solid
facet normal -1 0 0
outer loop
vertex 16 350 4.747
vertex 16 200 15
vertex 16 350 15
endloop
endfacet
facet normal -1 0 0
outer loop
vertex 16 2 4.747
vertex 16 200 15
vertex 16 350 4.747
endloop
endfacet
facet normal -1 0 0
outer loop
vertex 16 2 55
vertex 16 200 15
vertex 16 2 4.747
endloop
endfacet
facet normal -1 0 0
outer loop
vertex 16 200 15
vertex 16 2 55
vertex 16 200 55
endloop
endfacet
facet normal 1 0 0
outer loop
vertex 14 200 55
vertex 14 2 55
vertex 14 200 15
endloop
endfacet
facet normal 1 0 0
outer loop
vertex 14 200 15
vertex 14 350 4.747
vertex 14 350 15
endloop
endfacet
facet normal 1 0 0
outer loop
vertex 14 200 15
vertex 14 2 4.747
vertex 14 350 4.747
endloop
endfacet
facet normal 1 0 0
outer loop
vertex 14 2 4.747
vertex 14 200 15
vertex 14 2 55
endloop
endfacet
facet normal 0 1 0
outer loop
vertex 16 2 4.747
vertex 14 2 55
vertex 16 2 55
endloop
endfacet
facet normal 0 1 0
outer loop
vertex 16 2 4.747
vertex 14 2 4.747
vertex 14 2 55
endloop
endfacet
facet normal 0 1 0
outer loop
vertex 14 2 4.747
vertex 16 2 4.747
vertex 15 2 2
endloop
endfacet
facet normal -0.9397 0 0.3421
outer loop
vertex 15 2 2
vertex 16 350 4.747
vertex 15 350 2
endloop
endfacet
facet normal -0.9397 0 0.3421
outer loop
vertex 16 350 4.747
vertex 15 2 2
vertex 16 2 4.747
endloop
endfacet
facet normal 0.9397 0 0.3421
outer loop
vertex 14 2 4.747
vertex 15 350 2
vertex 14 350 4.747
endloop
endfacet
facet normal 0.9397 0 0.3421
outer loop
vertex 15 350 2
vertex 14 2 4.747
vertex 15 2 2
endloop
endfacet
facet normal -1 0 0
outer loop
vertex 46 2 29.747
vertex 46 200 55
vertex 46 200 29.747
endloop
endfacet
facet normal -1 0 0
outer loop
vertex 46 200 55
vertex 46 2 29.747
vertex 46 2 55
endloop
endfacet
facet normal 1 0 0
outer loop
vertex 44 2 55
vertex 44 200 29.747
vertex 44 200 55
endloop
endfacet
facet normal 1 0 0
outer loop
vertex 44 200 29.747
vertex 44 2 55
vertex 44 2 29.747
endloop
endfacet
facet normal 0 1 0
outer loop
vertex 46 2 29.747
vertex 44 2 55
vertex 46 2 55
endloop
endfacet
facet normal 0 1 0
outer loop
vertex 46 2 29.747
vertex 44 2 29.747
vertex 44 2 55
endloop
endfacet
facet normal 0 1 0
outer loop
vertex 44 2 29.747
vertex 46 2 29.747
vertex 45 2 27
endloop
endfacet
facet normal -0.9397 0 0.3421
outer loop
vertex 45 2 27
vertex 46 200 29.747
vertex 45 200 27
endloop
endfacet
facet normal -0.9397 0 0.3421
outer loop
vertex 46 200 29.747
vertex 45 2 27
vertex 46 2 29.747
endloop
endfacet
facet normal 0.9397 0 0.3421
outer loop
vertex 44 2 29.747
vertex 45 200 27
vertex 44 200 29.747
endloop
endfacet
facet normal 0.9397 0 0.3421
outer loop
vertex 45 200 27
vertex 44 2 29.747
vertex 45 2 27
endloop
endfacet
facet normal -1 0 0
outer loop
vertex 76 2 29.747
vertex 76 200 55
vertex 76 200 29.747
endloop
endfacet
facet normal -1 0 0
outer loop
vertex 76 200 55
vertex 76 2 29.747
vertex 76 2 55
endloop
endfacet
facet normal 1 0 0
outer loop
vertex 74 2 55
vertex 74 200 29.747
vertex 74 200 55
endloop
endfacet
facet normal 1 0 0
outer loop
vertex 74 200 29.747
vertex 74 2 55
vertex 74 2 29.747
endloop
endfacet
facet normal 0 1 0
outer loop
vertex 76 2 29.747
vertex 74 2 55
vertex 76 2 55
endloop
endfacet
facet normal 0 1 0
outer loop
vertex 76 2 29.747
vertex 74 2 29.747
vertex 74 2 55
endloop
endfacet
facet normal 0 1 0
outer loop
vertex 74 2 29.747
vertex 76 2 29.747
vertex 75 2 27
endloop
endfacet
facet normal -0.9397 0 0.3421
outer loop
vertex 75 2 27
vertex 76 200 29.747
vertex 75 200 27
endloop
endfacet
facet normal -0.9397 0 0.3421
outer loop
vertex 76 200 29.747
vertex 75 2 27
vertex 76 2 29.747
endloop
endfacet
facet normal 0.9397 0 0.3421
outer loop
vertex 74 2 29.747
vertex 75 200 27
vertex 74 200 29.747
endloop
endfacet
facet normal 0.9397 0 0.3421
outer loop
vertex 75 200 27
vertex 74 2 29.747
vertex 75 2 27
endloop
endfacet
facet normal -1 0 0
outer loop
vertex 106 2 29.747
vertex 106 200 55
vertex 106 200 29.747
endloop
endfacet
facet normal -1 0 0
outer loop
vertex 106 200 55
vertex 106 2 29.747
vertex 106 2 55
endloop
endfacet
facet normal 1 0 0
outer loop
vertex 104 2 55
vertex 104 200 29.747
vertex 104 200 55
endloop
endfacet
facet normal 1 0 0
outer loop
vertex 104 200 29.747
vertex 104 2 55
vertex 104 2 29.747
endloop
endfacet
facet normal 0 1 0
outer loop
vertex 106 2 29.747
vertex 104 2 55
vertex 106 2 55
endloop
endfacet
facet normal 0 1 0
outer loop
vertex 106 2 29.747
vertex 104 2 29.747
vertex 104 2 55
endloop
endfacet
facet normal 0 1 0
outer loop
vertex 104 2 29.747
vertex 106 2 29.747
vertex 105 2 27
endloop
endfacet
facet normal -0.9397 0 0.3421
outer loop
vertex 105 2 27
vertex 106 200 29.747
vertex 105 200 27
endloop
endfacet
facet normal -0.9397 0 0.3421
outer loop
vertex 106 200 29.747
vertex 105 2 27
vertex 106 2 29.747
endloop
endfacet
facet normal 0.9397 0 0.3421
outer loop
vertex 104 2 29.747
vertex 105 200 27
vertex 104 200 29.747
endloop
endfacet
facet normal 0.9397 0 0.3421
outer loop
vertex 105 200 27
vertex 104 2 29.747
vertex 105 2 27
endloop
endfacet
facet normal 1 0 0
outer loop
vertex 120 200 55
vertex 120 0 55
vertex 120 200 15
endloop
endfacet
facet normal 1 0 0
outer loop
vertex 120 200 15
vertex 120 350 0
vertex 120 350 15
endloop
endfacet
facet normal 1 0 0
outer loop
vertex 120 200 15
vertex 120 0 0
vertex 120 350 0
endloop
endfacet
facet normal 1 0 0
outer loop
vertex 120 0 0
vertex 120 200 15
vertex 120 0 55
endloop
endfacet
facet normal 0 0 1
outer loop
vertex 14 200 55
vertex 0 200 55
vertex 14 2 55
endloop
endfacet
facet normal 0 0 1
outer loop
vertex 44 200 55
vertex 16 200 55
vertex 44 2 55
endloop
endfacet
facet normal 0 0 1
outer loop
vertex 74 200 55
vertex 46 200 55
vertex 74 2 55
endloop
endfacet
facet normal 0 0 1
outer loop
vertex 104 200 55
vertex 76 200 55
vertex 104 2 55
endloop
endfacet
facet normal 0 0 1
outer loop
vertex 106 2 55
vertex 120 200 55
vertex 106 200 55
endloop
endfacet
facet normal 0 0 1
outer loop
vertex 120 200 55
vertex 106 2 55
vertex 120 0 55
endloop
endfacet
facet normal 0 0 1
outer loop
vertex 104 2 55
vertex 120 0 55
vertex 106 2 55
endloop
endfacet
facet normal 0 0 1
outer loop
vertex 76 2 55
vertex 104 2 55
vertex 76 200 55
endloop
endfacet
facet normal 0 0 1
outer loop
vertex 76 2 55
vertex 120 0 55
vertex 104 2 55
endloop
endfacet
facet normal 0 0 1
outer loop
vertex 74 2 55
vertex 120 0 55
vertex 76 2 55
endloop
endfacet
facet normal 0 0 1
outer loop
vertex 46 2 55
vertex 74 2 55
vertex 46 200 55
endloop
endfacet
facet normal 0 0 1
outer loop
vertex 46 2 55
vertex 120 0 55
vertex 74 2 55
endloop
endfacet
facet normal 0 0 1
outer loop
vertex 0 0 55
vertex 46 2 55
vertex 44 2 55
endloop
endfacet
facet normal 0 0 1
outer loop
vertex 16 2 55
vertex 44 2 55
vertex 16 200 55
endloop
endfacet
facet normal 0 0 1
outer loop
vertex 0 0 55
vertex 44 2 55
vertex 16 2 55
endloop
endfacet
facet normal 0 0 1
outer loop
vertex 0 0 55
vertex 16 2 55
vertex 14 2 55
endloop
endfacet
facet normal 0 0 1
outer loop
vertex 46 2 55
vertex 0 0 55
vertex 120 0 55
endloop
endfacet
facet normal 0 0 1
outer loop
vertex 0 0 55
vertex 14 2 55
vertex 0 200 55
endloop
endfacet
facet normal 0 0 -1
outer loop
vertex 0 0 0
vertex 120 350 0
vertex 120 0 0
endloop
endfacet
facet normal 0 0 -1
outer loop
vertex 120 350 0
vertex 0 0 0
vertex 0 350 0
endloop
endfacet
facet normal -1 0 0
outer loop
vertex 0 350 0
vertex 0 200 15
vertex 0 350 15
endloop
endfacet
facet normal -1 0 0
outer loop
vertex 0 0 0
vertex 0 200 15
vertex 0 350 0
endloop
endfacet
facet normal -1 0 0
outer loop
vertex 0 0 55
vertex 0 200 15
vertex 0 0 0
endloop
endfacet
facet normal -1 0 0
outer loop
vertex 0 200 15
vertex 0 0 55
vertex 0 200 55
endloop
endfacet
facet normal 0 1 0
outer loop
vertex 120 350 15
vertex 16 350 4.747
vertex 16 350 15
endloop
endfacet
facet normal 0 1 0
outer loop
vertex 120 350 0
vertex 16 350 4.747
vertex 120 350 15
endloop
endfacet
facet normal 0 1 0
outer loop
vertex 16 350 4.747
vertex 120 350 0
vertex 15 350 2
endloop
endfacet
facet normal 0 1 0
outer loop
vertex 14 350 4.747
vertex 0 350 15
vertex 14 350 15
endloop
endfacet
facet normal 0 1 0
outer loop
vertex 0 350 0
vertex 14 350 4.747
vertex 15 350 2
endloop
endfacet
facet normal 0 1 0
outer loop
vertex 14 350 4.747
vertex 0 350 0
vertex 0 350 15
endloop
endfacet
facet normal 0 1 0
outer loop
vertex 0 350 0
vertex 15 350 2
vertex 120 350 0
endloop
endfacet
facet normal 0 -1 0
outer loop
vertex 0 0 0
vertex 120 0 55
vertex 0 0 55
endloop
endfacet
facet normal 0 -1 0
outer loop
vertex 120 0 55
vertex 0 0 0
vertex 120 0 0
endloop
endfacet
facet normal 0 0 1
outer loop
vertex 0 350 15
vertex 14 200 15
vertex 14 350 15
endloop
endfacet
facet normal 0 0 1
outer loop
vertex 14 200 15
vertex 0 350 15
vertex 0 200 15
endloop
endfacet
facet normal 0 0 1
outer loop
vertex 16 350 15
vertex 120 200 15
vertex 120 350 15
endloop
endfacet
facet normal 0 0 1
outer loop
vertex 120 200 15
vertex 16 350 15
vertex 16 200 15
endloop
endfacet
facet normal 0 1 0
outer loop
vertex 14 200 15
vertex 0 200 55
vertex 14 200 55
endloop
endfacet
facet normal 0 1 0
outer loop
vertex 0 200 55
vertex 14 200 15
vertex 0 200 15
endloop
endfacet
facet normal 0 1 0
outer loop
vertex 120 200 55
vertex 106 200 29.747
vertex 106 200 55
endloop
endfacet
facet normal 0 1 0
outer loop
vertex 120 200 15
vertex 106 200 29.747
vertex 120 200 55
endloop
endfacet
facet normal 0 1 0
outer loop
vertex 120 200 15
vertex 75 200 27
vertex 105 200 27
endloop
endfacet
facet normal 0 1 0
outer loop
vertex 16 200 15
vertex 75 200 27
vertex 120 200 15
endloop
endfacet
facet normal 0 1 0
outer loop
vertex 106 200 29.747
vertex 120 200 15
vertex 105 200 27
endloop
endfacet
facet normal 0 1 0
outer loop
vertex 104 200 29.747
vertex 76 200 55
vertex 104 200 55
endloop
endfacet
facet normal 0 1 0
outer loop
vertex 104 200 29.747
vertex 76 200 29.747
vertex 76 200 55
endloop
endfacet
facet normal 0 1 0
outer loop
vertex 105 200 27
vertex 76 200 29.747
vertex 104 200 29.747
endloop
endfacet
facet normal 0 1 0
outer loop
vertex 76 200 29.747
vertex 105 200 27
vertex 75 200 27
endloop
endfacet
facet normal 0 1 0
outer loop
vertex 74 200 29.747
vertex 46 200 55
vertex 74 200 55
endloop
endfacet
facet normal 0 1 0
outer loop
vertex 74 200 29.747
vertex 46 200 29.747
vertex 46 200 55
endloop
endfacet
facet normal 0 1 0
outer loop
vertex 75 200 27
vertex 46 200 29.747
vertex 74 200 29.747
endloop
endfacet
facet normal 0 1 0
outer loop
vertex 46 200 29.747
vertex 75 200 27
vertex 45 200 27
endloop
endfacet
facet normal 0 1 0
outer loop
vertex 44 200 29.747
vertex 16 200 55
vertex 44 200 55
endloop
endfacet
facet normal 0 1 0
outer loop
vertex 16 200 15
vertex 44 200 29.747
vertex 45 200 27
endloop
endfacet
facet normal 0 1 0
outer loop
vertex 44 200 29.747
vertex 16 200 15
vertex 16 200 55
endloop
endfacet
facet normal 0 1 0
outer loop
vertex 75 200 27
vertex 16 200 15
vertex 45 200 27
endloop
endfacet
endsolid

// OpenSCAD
$fn=32;

// Basic dimensions of the big knife
blade_length=200;
blade_height=45;  // Depth of the biggest blade ( mine is 45mm )
handle_width=30;  // Handle width (23mm) plus a bit more
handle_height=30;  // Usedto calculate blade drop

// Small blade
small_height=20;  // general height
small_length=20;  // total length
small_blade_l=20; // length of longest small blade

width=handle_width*4;
length=250+100;
height=45+10;
slot=2; // Blade width, couple of mm.
wall=2; // End and base thickness

difference() {
    block(width,length,height);
    translate([-1,blade_length,blade_height-handle_height]) cube([width+2,length,height]);
    big_slots();
    

}

/**
 * A basic rectangular dish with fillets where walls join.
 */
module block(width,depth,height) {
    difference() {
        cube([width,depth,height]);
    }
}

module big_slots() {
    
    blade_depths=[45,20,20,20];
    
    for ( i=[0:3] ) {
        h=wall + blade_height - blade_depths[i];
        translate([(i * handle_width ) + handle_width/2, wall , h])
            slot(length,slot,height);
    }

}

module slot(l,w,h) {
    difference() {
        translate([0,l/2,h/2]) cube([w,l,h],center=true);
        rotate([0,20,0]) translate([w/2,l/2-1,h/2]) cube([w,l+3,h],center=true);
        rotate([0,-20,0]) translate([-w/2,l/2-1,h/2]) cube([w,l+3,h],center=true);
    }
}
    
    
